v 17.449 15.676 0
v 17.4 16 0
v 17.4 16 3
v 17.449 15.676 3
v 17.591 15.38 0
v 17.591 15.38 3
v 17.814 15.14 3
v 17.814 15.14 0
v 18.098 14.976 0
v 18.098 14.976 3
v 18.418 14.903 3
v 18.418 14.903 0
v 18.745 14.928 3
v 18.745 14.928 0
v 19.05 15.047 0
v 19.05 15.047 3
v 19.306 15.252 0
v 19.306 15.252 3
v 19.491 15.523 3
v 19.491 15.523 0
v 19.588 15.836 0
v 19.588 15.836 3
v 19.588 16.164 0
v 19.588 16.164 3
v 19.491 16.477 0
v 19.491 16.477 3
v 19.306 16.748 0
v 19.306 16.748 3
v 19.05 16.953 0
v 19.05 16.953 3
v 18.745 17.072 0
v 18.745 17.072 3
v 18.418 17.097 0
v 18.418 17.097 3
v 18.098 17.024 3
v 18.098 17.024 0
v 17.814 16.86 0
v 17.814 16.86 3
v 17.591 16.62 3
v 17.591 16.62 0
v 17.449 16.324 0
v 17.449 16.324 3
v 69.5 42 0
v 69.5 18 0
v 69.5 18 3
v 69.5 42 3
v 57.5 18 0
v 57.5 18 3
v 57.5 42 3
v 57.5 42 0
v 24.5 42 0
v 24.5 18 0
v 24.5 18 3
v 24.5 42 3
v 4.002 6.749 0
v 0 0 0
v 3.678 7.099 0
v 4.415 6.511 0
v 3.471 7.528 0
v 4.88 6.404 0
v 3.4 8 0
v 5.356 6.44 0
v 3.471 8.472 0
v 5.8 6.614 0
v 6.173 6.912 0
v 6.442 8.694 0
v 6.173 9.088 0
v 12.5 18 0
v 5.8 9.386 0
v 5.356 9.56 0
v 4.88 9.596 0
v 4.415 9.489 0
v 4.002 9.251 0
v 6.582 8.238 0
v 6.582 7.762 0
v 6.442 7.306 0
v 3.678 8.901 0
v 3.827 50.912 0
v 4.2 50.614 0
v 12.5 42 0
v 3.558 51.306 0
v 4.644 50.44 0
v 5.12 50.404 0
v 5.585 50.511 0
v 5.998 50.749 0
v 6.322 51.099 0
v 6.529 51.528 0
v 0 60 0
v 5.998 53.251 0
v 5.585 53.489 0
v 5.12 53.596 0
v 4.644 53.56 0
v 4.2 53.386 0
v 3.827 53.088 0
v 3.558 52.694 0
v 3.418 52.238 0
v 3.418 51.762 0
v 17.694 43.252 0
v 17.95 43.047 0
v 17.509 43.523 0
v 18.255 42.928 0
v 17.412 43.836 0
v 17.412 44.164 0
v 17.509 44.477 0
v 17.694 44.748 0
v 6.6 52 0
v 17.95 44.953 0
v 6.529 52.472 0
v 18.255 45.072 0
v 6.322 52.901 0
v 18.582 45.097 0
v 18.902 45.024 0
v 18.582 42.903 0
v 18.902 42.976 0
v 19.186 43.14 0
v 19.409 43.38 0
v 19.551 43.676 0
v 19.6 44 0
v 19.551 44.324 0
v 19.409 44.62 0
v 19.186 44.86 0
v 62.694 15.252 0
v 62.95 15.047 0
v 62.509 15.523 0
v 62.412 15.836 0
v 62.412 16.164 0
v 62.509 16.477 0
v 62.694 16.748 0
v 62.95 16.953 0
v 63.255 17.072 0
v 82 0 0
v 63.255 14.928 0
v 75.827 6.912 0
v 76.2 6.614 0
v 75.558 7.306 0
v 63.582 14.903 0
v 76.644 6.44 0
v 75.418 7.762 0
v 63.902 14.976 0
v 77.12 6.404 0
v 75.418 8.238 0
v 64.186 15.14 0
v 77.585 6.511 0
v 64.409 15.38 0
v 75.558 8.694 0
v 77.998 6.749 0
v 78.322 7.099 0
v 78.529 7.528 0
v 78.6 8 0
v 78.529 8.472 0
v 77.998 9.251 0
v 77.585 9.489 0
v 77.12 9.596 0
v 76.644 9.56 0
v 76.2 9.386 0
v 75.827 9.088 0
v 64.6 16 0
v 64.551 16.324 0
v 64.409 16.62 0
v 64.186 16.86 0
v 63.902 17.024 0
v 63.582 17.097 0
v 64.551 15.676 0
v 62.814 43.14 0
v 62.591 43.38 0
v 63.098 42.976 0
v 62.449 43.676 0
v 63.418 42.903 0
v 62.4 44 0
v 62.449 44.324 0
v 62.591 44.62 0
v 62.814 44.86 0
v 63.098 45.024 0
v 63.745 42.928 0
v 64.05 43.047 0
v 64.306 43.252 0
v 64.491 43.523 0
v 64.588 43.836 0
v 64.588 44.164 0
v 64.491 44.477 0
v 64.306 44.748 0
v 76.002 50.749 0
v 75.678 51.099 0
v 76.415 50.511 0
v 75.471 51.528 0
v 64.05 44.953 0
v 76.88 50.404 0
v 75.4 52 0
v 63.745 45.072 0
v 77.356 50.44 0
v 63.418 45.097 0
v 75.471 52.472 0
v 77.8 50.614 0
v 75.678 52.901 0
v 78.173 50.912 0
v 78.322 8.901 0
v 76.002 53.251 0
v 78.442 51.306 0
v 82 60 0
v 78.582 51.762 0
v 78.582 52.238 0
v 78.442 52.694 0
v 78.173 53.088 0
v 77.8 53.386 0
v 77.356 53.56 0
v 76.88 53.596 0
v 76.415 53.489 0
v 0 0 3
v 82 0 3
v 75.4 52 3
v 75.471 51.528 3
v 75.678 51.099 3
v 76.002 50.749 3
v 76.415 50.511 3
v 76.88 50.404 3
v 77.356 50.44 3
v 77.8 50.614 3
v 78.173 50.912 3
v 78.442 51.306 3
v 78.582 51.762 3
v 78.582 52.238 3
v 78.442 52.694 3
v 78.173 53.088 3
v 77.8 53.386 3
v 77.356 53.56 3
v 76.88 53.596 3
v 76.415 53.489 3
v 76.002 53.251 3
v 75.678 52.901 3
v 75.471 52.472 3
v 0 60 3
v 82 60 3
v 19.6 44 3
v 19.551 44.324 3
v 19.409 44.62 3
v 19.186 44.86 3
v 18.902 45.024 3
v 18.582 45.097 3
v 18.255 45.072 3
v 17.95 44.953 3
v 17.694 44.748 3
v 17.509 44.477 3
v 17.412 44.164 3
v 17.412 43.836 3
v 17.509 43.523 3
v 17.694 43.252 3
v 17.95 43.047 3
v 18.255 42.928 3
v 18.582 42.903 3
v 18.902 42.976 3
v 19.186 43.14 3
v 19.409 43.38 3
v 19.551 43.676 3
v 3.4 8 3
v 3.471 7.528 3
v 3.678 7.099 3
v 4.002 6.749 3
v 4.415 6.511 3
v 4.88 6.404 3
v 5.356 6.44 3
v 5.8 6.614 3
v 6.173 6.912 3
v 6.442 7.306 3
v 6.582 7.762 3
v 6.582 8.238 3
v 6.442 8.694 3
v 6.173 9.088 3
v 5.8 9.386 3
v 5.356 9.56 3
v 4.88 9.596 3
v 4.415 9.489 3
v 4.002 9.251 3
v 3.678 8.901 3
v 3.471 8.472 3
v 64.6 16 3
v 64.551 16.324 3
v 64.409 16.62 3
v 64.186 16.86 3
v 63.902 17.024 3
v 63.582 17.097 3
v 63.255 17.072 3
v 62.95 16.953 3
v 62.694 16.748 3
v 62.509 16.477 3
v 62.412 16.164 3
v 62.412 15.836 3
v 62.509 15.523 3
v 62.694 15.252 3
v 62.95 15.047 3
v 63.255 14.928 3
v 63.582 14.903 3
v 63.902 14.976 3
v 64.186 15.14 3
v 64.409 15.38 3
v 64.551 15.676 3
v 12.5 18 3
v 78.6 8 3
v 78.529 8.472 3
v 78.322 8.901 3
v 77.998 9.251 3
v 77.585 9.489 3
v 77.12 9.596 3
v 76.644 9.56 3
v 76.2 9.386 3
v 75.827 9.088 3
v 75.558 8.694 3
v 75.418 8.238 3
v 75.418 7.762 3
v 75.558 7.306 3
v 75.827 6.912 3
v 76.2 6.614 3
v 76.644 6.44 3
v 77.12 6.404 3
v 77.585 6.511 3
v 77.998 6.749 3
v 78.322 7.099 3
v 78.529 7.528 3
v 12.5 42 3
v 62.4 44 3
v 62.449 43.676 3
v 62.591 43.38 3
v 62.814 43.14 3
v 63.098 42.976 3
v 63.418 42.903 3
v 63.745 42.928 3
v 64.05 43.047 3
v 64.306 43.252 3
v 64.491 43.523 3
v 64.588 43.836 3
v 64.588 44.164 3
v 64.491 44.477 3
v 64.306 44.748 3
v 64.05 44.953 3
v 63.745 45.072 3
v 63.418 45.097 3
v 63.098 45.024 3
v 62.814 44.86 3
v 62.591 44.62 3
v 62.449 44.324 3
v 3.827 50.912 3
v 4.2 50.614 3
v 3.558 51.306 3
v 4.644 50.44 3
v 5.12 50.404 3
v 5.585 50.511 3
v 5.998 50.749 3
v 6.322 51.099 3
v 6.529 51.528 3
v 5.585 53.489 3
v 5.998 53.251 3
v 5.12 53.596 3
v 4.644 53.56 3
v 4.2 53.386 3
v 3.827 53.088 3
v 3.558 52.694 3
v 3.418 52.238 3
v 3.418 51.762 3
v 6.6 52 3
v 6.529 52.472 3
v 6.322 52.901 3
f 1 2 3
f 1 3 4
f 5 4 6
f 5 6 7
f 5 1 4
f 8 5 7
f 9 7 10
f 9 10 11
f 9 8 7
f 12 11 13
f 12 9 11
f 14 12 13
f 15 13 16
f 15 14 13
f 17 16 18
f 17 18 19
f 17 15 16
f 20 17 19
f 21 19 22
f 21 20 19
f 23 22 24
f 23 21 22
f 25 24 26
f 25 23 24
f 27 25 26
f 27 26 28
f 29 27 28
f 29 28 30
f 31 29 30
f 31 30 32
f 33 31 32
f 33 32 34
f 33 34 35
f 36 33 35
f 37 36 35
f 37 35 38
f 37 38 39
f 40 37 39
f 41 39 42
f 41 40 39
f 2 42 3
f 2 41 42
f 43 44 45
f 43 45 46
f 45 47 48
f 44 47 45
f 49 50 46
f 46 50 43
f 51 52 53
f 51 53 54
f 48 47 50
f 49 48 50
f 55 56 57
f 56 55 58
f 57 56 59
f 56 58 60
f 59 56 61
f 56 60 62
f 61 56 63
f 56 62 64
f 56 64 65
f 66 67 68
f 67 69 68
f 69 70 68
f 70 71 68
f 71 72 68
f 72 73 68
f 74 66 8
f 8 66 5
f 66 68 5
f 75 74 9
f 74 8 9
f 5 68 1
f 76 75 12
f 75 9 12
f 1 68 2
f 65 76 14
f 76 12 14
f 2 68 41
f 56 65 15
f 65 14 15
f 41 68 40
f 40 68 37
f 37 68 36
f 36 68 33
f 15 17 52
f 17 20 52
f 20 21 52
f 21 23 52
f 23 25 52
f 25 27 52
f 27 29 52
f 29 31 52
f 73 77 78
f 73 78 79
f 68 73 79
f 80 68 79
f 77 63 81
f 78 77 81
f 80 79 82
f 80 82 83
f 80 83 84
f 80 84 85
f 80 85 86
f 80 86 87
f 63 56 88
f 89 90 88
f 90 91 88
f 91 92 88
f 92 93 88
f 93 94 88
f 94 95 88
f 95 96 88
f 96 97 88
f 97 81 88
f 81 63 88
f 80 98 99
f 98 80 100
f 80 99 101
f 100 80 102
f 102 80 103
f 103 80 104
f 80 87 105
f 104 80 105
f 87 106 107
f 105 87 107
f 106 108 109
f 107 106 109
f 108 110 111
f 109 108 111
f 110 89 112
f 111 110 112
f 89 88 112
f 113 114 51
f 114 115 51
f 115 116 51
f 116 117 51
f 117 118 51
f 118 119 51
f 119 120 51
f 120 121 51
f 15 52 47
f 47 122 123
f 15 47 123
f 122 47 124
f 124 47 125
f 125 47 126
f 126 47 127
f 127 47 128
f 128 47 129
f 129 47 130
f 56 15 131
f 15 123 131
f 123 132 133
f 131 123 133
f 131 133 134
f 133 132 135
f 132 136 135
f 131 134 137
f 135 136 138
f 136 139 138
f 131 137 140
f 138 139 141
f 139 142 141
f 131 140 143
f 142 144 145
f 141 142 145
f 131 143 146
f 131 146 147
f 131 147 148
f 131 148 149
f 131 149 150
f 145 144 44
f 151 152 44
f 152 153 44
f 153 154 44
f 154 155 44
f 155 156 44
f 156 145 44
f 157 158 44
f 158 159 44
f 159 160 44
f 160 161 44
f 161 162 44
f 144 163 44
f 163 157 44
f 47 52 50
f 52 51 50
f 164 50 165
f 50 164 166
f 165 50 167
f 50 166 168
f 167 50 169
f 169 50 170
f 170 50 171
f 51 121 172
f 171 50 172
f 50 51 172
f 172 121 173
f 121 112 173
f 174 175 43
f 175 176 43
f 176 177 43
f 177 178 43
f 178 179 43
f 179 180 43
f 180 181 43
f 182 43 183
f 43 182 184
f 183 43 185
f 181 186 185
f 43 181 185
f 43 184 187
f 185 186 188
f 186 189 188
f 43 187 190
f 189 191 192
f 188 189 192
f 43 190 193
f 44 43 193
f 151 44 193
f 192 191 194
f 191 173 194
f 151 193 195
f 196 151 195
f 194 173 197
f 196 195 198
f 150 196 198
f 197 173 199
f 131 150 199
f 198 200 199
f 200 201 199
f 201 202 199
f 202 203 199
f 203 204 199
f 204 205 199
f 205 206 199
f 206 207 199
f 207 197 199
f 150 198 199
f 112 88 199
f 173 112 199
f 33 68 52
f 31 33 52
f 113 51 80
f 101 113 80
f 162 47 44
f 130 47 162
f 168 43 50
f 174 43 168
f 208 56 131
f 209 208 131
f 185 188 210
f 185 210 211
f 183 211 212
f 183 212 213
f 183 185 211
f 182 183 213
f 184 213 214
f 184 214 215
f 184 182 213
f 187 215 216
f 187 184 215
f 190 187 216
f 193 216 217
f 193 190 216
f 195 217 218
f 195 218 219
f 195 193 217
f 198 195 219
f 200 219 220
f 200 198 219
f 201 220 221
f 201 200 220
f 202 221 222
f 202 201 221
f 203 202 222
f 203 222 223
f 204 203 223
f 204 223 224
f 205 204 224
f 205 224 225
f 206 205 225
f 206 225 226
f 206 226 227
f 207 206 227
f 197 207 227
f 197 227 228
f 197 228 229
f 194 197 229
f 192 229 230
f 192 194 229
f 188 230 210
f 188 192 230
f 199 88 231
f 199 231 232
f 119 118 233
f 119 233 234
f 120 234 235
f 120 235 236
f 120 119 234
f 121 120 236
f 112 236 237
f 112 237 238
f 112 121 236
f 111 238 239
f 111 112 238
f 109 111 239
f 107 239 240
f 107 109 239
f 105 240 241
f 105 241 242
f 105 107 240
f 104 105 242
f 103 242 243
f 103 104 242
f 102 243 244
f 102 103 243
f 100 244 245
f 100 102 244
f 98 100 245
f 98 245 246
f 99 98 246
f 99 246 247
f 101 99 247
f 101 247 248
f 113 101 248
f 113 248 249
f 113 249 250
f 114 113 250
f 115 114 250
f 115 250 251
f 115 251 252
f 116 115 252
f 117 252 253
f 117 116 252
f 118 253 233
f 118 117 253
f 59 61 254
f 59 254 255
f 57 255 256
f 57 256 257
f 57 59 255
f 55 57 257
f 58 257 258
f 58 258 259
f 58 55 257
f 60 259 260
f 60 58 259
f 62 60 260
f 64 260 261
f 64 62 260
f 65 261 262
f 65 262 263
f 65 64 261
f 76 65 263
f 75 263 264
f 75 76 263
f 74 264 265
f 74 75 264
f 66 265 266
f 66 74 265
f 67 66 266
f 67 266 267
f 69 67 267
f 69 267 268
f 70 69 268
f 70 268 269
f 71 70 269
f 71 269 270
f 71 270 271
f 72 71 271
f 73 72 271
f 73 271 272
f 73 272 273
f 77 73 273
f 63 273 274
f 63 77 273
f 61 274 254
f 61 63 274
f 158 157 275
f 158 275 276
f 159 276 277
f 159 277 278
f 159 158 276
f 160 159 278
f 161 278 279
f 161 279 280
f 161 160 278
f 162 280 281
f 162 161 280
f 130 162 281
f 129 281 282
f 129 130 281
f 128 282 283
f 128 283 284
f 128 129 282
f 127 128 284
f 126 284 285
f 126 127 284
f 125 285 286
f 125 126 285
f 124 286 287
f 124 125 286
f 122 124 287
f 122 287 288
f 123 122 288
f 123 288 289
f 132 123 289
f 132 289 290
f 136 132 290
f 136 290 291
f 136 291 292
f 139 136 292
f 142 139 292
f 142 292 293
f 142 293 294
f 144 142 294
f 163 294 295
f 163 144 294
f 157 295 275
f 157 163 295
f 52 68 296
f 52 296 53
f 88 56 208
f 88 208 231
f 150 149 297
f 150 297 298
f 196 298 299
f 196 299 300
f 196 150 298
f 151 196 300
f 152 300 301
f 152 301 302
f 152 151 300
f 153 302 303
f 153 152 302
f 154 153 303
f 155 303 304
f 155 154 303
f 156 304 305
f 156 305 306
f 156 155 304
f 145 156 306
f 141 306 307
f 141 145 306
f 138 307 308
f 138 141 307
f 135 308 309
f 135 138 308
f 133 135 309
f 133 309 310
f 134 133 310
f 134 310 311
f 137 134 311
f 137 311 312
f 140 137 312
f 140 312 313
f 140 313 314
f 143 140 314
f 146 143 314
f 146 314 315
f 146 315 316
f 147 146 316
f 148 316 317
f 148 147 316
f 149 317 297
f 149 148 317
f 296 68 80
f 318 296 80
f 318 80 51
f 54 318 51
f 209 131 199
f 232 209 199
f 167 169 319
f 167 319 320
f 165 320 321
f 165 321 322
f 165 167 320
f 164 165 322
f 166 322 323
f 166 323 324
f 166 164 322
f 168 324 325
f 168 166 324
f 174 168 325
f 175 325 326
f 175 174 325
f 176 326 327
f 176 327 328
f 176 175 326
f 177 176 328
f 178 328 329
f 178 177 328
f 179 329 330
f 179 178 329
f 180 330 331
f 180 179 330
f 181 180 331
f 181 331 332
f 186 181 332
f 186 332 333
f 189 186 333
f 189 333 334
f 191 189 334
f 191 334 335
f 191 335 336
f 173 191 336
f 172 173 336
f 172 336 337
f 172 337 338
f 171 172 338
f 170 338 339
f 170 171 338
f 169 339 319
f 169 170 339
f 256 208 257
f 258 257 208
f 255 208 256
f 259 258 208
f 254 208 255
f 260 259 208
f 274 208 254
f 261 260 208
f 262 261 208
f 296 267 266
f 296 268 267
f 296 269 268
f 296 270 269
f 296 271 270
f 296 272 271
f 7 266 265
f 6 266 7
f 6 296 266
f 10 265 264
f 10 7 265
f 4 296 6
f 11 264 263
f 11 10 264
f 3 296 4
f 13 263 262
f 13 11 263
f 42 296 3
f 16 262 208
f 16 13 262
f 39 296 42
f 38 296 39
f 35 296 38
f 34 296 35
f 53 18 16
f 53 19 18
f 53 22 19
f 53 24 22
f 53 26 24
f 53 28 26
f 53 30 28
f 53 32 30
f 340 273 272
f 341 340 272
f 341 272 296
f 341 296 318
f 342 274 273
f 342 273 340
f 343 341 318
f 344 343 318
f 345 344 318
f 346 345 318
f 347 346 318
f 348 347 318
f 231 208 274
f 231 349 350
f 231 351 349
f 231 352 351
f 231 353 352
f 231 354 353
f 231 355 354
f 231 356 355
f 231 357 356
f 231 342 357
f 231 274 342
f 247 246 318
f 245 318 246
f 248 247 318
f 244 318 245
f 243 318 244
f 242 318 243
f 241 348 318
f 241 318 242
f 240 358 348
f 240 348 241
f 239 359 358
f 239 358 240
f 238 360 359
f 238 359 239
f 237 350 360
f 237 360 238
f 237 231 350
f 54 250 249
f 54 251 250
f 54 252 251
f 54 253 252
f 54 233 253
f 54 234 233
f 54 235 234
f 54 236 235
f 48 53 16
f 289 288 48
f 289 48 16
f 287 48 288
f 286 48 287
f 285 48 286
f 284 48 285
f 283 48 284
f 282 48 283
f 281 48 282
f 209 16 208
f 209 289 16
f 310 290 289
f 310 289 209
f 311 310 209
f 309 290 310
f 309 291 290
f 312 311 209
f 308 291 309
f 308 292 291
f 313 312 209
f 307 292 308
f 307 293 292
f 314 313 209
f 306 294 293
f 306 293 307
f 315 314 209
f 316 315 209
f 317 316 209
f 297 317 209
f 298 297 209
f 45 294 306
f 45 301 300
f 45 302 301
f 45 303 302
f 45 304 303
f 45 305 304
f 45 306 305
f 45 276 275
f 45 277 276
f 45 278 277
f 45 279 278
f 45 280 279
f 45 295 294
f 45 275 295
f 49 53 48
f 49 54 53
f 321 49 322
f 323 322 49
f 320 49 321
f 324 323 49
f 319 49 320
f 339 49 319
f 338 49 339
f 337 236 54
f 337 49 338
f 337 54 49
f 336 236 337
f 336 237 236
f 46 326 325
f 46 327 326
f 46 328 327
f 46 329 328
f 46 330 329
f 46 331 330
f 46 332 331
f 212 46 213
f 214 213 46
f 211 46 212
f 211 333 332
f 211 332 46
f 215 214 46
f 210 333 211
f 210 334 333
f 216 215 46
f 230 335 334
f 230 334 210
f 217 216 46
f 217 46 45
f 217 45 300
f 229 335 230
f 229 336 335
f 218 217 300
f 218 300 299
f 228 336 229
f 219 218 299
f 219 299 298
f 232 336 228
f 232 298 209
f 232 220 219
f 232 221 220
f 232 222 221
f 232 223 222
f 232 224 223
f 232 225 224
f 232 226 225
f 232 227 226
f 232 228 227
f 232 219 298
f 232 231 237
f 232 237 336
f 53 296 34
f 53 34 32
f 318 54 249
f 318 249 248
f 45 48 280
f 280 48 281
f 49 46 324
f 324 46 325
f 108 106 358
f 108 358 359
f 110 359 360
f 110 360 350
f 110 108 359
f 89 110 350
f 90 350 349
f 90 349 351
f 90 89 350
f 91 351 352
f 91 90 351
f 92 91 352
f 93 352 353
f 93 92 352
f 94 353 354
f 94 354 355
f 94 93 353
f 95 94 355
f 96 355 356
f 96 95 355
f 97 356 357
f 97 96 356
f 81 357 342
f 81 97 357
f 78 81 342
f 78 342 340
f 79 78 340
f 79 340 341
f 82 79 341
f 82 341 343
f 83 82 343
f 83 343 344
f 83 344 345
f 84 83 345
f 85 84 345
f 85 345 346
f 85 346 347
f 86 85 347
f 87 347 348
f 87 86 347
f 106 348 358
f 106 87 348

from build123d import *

# Parameters (mm, degrees)
SKETCH_1_W      = 82
SKETCH_1_H      = 60
SKETCH_1_R      = 1.1
SKETCH_1_R_2    = 1.6
SKETCH_1_W_2    = 12
SKETCH_1_H_2    = 24
EXTRUDE_1_DEPTH = 3


with BuildPart() as part:
    # 草图1 → 凸台-拉伸1 (new body)
    with BuildSketch(Plane.XY):
        with Locations((41, 30)):
            Rectangle(SKETCH_1_W, SKETCH_1_H)
        with Locations((18.5, 44)):
            Circle(SKETCH_1_R, mode=Mode.SUBTRACT)
        with Locations(Location((18.5, 16, 0), (0, 0, 180))):
            Circle(SKETCH_1_R, mode=Mode.SUBTRACT)
        with Locations((77, 8)):
            Circle(SKETCH_1_R_2, mode=Mode.SUBTRACT)
        with Locations(Location((5, 8, 0), (0, 0, 180))):
            Circle(SKETCH_1_R_2, mode=Mode.SUBTRACT)
        with Locations(Location((77, 52, 0), (0, 0, 180))):
            Circle(SKETCH_1_R_2, mode=Mode.SUBTRACT)
        with Locations((5, 52)):
            Circle(SKETCH_1_R_2, mode=Mode.SUBTRACT)
        with Locations((63.5, 16)):
            Circle(SKETCH_1_R, mode=Mode.SUBTRACT)
        with Locations(Location((63.5, 44, 0), (0, 0, 180))):
            Circle(SKETCH_1_R, mode=Mode.SUBTRACT)
        with Locations((63.5, 30)):
            Rectangle(SKETCH_1_W_2, SKETCH_1_H_2, mode=Mode.SUBTRACT)
        with Locations((18.5, 30)):
            Rectangle(SKETCH_1_W_2, SKETCH_1_H_2, mode=Mode.SUBTRACT)
    extrude(amount=EXTRUDE_1_DEPTH)


solid = part.part
